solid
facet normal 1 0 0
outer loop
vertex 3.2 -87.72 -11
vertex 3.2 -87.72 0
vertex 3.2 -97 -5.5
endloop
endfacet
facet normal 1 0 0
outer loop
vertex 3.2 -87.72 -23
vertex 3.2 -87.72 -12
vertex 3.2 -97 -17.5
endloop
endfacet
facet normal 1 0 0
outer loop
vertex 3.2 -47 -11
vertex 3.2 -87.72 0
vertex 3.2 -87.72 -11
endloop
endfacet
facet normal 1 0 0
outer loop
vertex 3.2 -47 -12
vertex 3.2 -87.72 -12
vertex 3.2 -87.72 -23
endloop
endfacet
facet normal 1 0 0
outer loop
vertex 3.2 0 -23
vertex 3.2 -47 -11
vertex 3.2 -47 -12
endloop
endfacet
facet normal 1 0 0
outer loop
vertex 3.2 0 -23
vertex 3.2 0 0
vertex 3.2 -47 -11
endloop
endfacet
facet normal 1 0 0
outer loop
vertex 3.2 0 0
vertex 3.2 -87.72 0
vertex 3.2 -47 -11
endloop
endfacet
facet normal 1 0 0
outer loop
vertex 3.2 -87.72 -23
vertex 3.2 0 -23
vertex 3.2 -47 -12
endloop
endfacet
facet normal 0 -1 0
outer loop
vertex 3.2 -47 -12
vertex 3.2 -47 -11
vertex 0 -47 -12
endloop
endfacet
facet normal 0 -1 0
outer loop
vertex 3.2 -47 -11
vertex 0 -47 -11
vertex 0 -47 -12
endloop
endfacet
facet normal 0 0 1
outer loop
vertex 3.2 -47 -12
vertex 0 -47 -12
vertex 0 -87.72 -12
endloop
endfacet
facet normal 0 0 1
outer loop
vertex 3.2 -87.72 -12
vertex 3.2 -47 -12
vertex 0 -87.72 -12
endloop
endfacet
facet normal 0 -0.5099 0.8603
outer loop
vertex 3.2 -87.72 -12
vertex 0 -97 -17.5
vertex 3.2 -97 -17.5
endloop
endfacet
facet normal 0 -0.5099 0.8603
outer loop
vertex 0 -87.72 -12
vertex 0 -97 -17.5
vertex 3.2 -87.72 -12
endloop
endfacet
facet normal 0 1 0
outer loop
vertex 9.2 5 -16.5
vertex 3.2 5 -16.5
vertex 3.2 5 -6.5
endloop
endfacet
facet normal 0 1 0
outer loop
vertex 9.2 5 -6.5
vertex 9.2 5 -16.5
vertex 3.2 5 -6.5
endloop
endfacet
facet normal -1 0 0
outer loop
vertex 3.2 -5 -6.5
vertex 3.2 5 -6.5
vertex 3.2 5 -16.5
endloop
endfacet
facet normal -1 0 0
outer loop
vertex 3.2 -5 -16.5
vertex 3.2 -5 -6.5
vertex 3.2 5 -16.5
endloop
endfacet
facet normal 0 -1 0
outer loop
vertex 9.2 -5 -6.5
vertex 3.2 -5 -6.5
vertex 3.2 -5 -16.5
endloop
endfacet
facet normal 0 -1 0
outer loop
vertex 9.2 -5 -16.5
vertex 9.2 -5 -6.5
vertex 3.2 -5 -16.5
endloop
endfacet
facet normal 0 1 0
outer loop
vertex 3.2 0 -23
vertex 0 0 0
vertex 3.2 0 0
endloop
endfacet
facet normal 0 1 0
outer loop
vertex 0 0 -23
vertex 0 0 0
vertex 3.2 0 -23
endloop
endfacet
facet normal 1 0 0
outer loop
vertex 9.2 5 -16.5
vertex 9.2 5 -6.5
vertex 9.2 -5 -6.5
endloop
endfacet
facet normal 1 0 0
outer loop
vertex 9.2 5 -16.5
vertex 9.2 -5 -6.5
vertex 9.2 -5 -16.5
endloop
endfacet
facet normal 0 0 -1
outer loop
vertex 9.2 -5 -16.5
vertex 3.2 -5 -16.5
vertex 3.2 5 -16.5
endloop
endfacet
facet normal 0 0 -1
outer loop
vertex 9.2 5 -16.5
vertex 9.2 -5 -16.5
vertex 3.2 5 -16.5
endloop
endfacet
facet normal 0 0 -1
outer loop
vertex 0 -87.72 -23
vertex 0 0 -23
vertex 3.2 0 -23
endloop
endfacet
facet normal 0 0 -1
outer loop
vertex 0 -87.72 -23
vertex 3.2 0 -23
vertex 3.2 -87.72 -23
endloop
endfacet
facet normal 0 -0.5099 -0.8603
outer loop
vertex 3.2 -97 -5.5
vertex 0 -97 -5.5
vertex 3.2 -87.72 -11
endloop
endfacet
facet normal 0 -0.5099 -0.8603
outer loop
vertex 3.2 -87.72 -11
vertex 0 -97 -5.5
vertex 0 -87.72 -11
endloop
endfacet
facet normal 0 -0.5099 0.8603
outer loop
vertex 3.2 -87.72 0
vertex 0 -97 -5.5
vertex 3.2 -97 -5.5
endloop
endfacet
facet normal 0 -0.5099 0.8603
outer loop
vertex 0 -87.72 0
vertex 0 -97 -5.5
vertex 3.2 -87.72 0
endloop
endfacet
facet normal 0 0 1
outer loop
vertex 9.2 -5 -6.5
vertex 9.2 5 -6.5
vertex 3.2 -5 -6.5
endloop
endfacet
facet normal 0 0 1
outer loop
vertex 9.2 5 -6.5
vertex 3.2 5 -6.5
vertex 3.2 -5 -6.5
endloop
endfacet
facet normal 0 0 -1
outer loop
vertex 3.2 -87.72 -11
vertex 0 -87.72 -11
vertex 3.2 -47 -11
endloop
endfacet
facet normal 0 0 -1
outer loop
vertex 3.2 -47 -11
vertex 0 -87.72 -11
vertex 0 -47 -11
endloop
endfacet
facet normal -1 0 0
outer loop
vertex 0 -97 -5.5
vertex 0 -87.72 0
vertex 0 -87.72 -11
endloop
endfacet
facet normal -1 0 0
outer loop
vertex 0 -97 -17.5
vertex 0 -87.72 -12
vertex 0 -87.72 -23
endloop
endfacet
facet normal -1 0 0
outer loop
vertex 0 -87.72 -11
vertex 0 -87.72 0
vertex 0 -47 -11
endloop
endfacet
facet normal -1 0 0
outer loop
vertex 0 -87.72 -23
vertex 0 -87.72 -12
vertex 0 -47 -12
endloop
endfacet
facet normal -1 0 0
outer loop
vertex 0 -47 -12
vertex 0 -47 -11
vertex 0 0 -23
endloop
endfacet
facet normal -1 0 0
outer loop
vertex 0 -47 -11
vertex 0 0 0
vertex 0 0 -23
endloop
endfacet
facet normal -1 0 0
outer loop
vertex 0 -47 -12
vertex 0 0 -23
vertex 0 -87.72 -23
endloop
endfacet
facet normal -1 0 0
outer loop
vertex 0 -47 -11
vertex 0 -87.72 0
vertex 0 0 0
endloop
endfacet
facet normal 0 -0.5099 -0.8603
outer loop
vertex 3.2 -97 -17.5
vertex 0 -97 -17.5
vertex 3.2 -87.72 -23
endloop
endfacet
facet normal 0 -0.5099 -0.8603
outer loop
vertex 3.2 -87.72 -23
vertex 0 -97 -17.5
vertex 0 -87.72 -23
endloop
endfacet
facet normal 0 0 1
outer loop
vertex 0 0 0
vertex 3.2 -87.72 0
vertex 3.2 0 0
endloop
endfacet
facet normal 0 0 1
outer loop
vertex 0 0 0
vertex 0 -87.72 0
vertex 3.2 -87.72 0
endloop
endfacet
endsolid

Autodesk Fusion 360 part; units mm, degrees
sketch "Sketch1" plane through (0, 0, 0) normal (1, 0, 0) x (0, 0, -1)
  line L0 (0, 0) -> (23, 0)
  line L1 (23, 0) -> (23, -97)
  line L2 (23, -97) -> (0, -97)
  line L3 (0, -97) -> (0, 0)
  line L4 (11, -47) -> (12, -47)
  line L5 (12, -47) -> (12, -97)
  line L6 (12, -97) -> (11, -97)
  line L7 (11, -97) -> (11, -47)
  line L8 (0, -87.7196) -> (11, -87.7196)
  line L9 (12, -87.7196) -> (23, -87.7196)
  line L10 (5.5, -87.7196) -> (5.5, -97)
  line L11 (17.5, -87.7196) -> (17.5, -97)
  line L12 (17.5, -97) -> (12, -87.7196)
  line L13 (17.5, -97) -> (23, -87.7196)
  line L14 (5.5, -97) -> (0, -87.7196)
  line L15 (5.5, -97) -> (11, -87.7196)
  point P0 (11.5, -97)
  dimension "d46" = 97
  dimension "d47" = 23
  dimension "d48" = 1
  dimension "d49" = 50
extrude "Extrude1" add sketch "Sketch1" along normal blind 3.2 contours L0 L1 L3 L4 L5 L7 L8 L9 | L8 L10 L14 | L9 L11 L13 | L8 L10 L15 | L9 L11 L12 makes body 1
ref_plane "WorkPlane1" through (3.2, -48.5, -11.5) normal (1, 0, 0) x (0, 0, -1)
sketch "Sketch2" plane through (3.2, -30, -10) normal (1, 0, 0) x (0, 0, -1)
  line L0 (-3.5, 25) -> (6.5, 25)
  line L1 (6.5, 25) -> (6.5, 35)
  line L2 (6.5, 35) -> (-3.5, 35)
  line L3 (-3.5, 35) -> (-3.5, 25)
  line L4 (13, 30) -> (-10, 30)
  line L5 (1.5, 30) -> (1.5, 40) construction
  dimension "d60" = 10
  dimension "d61" = 10
  dimension "d1" = 5
extrude "Extrude2" add sketch "Sketch2" along normal blind 6 separate body makes body 2
sketch "used for creating hole in the outer box" plane through (0, 0, 0) normal (0, 1, 0) x (-1, 0, 0)
  line L0 (0, -23) -> (0, 0)
  line L1 (0, 0) -> (-3.2, 0)
  line L2 (-3.2, 0) -> (-3.2, -23)
  line L3 (-3.2, -23) -> (0, -23)
  line L4 (-3.2, -24) -> (0.5, -24)
  line L5 (0.5, -24) -> (0.5, 1)
  line L6 (0.5, 1) -> (-3.2, 1)
  line L7 (-3.2, 1) -> (-3.2, -24)
  line L8 (0, 0) -> (0, -23)
  dimension "d181" = 1
  dimension "d182" = 1
  dimension "d2" = 0.5
sketch "Sketch6" plane through (3.2, 0, 0) normal (1, 0, 0) x (0, 1, 0)
  line L0 (-87.7196, 0) -> (-97, -5.5)
  line L1 (-97, -5.5) -> (-87.7196, -11)
  line L2 (-87.7196, -11) -> (-47, -11)
  line L3 (-47, -11) -> (-47, -12)
  line L4 (-47, -12) -> (-87.7196, -12)
  line L5 (-87.7196, -12) -> (-97, -17.5)
  line L6 (-97, -17.5) -> (-87.7196, -23)
  line L7 (-87.7196, -23) -> (0, -23)
  line L8 (0, -23) -> (0, 0)
  line L9 (0, 0) -> (-87.7196, 0)
  line L10 (-27, 0) -> (-27, -23)
  line L11 (0, 1) -> (0, -24)
  dimension "d3" = 27
